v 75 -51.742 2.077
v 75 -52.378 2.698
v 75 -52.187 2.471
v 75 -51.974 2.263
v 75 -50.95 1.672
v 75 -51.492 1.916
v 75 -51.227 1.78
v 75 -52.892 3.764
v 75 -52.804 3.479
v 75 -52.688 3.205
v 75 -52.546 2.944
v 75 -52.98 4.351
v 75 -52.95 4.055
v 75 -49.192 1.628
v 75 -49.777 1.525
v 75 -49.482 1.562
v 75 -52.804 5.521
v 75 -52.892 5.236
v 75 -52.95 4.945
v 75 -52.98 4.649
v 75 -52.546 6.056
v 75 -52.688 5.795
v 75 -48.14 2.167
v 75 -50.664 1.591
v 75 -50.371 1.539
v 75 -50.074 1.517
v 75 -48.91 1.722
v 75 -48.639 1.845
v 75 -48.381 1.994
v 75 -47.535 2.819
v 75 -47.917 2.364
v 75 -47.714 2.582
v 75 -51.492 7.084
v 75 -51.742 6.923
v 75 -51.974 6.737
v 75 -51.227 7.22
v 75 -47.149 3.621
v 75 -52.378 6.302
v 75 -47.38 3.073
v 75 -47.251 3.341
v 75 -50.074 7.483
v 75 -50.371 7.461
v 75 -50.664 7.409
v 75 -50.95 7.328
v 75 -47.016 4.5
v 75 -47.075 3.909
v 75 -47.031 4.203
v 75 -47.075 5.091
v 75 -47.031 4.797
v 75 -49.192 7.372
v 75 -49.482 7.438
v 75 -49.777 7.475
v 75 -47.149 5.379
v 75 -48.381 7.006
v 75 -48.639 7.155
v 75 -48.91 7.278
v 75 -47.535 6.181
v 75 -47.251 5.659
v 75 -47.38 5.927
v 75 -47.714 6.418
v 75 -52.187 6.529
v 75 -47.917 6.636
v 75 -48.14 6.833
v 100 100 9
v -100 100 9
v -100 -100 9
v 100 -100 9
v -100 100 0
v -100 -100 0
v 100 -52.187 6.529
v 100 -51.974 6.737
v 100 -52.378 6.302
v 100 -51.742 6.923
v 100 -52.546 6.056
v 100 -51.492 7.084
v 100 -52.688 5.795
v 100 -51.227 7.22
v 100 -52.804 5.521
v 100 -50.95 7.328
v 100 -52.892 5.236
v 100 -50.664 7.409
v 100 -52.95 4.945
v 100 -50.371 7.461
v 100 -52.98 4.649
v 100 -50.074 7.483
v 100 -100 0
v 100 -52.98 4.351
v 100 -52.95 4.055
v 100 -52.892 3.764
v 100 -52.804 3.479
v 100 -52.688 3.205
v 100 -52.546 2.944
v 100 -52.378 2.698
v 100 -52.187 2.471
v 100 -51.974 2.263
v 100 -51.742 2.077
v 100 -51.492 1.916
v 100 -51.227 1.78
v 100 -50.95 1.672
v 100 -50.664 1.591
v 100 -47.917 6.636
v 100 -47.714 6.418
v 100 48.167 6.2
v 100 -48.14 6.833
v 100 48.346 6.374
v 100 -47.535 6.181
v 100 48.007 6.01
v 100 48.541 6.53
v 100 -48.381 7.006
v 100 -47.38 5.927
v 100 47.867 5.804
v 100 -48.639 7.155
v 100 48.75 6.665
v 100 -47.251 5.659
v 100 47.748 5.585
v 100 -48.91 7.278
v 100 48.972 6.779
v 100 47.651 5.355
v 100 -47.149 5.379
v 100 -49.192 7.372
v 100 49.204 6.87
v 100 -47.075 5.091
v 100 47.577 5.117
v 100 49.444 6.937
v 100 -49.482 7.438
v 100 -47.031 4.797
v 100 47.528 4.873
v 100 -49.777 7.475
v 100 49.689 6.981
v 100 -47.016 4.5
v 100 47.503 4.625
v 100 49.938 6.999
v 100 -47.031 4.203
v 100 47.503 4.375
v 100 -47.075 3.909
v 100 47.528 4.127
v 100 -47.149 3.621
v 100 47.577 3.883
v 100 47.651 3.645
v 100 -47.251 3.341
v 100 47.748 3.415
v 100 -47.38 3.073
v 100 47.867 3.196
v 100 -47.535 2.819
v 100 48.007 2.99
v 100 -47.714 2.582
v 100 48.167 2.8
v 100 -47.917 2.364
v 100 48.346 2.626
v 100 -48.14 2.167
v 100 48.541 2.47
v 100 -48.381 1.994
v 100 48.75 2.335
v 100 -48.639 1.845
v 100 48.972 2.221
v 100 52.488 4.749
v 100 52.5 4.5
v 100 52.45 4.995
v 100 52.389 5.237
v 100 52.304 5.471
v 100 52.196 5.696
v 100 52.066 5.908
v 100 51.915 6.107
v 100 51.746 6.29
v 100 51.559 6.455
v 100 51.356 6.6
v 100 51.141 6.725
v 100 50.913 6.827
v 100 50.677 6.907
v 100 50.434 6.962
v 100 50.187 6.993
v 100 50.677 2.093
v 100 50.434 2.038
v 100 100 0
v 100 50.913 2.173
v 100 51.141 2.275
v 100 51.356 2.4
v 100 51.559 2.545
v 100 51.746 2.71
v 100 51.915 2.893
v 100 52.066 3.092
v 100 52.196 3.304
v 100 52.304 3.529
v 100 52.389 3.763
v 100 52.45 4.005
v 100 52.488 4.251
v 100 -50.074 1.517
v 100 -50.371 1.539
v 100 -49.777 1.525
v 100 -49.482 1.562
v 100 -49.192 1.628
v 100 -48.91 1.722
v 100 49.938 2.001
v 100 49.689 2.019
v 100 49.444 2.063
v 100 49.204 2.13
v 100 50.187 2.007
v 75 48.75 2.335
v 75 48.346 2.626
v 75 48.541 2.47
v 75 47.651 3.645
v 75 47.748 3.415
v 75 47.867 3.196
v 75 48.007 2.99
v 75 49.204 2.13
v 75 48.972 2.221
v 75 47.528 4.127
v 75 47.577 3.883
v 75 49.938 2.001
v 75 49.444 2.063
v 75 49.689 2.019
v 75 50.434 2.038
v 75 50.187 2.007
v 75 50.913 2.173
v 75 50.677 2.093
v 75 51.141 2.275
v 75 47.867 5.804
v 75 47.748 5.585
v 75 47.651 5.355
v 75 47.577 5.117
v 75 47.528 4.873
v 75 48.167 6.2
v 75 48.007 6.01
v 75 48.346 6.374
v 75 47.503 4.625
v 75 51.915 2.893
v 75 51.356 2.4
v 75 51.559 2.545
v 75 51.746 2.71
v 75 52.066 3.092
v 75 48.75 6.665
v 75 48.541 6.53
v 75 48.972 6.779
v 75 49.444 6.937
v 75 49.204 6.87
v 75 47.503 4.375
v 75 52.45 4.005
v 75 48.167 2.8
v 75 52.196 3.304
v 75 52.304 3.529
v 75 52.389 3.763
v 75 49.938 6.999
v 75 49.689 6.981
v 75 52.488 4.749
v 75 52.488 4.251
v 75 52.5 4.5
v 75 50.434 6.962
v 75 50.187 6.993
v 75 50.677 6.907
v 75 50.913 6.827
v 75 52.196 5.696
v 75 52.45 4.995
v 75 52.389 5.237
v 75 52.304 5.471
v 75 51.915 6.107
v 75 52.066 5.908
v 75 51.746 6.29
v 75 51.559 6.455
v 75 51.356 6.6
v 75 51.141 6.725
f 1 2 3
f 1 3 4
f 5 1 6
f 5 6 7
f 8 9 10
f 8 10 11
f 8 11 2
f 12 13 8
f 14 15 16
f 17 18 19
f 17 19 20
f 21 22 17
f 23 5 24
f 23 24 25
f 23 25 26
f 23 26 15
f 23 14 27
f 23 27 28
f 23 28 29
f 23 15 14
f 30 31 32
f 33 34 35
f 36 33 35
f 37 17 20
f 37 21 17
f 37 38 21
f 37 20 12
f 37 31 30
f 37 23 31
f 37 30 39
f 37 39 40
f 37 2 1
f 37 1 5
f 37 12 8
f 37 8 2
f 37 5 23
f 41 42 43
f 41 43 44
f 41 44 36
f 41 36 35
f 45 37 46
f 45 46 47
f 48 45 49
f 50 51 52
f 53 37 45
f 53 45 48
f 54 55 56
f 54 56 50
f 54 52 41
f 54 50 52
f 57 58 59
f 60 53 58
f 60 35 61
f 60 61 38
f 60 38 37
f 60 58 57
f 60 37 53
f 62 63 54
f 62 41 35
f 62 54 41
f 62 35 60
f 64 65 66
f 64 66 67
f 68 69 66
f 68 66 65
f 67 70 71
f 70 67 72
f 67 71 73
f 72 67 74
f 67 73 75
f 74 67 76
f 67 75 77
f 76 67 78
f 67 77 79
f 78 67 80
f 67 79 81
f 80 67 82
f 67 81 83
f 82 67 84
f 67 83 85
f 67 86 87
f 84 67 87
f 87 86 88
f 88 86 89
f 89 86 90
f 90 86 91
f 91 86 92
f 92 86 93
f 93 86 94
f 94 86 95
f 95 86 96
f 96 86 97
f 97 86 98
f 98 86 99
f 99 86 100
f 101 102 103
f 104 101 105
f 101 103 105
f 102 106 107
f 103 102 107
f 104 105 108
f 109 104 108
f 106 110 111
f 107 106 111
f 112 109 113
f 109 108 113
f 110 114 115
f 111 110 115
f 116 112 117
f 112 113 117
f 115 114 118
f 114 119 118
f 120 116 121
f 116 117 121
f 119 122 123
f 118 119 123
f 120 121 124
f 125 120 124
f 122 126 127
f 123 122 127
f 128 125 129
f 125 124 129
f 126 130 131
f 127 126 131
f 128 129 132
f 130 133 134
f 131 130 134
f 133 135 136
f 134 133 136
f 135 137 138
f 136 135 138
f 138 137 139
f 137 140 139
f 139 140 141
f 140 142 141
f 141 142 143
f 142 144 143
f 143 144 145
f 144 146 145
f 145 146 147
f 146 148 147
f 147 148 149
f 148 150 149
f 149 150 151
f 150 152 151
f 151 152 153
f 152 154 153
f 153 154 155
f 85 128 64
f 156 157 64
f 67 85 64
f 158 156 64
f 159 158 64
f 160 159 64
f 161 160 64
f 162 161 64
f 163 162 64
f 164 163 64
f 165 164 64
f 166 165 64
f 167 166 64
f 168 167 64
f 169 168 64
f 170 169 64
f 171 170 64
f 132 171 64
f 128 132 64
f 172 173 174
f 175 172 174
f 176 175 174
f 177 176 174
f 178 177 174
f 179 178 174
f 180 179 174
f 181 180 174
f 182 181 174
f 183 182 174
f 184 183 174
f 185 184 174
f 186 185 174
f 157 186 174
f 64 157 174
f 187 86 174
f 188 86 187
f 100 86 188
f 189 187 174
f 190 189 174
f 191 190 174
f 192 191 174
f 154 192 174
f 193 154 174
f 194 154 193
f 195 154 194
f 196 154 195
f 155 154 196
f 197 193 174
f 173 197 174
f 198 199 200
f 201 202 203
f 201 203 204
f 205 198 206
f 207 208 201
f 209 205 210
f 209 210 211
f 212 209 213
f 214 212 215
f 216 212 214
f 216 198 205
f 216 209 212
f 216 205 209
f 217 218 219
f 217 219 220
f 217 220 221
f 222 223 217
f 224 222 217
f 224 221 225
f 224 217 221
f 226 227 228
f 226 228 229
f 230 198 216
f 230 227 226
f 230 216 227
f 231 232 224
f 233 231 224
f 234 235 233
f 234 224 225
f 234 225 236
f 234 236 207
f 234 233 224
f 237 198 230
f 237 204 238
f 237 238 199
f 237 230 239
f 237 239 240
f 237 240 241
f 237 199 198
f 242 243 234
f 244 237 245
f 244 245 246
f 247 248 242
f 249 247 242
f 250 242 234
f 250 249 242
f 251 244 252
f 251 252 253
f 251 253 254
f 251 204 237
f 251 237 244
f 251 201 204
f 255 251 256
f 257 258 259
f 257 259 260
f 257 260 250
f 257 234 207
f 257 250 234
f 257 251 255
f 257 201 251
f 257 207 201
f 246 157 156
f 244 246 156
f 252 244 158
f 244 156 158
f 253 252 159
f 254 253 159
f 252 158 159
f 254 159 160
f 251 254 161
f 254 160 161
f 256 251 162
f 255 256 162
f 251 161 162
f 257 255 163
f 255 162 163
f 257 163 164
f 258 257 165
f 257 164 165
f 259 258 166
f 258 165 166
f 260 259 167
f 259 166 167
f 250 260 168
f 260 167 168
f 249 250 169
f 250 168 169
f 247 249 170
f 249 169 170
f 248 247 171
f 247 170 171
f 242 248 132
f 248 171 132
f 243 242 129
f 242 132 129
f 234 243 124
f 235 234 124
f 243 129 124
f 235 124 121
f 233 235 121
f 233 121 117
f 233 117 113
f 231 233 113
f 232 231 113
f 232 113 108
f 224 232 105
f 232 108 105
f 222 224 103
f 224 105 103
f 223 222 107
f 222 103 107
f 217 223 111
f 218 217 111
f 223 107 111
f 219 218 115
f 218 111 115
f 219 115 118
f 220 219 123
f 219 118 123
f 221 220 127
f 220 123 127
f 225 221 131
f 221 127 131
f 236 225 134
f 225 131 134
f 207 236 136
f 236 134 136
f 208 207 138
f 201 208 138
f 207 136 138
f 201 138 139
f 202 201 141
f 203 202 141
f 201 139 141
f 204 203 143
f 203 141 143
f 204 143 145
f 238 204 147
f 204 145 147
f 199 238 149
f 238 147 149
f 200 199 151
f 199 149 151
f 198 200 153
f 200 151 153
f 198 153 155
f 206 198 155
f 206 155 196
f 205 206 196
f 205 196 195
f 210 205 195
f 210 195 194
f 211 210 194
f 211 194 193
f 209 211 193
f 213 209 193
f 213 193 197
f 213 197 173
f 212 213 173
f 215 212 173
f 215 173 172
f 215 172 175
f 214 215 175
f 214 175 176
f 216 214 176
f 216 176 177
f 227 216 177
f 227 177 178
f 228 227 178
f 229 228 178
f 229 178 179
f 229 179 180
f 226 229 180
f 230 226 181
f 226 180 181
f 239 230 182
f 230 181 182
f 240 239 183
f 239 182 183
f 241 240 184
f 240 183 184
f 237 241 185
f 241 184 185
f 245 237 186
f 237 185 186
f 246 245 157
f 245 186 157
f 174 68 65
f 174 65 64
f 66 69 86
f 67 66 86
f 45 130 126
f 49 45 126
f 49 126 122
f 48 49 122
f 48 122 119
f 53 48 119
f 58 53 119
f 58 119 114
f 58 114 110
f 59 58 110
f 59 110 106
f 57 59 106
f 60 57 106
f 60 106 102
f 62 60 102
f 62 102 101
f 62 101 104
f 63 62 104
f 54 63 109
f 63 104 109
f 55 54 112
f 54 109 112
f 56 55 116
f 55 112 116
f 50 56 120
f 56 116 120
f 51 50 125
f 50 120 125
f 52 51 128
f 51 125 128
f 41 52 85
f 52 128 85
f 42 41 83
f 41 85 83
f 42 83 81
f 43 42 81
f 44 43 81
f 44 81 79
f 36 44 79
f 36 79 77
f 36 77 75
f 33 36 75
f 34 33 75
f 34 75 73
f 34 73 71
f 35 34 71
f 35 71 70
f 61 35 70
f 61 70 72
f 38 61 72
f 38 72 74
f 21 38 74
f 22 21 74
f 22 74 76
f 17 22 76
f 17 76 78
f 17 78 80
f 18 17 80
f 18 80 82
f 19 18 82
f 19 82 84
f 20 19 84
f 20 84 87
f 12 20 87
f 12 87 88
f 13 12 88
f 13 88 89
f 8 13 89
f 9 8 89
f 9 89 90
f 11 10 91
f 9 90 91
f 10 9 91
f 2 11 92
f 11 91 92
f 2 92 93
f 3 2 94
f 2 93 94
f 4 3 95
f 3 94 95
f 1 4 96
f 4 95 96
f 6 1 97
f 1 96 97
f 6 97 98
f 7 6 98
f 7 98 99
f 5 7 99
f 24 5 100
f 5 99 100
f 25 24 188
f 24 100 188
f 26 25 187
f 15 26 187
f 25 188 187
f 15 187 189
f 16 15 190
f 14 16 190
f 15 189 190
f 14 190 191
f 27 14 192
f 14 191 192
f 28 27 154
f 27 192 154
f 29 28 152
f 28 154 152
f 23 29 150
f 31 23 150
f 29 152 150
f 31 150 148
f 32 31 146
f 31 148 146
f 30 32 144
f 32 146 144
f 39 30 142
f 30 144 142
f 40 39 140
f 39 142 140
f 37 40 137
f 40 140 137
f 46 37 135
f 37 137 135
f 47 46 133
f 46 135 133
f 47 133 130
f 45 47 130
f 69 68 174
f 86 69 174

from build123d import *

# Parameters (mm, degrees)
F0_W     = 200
F0_H     = 200
F1_DEPTH = 9
F2_R     = 2.983791
F2_R_2   = 2.5
F3_DEPTH = 25
F4_DEPTH = 15


with BuildPart() as f1:
    # F0 (on Top) → F1 (new body)
    with BuildSketch(Plane.XY):
        Rectangle(F0_W, F0_H)
    extrude(amount=F1_DEPTH)

    # F2 (on face) → F3 (cut)
    with BuildSketch(Plane.YZ.offset(100)):
        with Locations((-50, 4.5)):
            Circle(F2_R)
        with Locations((50, 4.5)):
            Circle(F2_R_2)
    extrude(amount=-F3_DEPTH, mode=Mode.SUBTRACT)

    # F2 (on face) → F4 (cut)
    with BuildSketch(Plane.YZ.offset(100)):
        with Locations((-50, 4.5)):
            Circle(F2_R)
    extrude(amount=-F4_DEPTH, mode=Mode.SUBTRACT)


solid = f1.part
